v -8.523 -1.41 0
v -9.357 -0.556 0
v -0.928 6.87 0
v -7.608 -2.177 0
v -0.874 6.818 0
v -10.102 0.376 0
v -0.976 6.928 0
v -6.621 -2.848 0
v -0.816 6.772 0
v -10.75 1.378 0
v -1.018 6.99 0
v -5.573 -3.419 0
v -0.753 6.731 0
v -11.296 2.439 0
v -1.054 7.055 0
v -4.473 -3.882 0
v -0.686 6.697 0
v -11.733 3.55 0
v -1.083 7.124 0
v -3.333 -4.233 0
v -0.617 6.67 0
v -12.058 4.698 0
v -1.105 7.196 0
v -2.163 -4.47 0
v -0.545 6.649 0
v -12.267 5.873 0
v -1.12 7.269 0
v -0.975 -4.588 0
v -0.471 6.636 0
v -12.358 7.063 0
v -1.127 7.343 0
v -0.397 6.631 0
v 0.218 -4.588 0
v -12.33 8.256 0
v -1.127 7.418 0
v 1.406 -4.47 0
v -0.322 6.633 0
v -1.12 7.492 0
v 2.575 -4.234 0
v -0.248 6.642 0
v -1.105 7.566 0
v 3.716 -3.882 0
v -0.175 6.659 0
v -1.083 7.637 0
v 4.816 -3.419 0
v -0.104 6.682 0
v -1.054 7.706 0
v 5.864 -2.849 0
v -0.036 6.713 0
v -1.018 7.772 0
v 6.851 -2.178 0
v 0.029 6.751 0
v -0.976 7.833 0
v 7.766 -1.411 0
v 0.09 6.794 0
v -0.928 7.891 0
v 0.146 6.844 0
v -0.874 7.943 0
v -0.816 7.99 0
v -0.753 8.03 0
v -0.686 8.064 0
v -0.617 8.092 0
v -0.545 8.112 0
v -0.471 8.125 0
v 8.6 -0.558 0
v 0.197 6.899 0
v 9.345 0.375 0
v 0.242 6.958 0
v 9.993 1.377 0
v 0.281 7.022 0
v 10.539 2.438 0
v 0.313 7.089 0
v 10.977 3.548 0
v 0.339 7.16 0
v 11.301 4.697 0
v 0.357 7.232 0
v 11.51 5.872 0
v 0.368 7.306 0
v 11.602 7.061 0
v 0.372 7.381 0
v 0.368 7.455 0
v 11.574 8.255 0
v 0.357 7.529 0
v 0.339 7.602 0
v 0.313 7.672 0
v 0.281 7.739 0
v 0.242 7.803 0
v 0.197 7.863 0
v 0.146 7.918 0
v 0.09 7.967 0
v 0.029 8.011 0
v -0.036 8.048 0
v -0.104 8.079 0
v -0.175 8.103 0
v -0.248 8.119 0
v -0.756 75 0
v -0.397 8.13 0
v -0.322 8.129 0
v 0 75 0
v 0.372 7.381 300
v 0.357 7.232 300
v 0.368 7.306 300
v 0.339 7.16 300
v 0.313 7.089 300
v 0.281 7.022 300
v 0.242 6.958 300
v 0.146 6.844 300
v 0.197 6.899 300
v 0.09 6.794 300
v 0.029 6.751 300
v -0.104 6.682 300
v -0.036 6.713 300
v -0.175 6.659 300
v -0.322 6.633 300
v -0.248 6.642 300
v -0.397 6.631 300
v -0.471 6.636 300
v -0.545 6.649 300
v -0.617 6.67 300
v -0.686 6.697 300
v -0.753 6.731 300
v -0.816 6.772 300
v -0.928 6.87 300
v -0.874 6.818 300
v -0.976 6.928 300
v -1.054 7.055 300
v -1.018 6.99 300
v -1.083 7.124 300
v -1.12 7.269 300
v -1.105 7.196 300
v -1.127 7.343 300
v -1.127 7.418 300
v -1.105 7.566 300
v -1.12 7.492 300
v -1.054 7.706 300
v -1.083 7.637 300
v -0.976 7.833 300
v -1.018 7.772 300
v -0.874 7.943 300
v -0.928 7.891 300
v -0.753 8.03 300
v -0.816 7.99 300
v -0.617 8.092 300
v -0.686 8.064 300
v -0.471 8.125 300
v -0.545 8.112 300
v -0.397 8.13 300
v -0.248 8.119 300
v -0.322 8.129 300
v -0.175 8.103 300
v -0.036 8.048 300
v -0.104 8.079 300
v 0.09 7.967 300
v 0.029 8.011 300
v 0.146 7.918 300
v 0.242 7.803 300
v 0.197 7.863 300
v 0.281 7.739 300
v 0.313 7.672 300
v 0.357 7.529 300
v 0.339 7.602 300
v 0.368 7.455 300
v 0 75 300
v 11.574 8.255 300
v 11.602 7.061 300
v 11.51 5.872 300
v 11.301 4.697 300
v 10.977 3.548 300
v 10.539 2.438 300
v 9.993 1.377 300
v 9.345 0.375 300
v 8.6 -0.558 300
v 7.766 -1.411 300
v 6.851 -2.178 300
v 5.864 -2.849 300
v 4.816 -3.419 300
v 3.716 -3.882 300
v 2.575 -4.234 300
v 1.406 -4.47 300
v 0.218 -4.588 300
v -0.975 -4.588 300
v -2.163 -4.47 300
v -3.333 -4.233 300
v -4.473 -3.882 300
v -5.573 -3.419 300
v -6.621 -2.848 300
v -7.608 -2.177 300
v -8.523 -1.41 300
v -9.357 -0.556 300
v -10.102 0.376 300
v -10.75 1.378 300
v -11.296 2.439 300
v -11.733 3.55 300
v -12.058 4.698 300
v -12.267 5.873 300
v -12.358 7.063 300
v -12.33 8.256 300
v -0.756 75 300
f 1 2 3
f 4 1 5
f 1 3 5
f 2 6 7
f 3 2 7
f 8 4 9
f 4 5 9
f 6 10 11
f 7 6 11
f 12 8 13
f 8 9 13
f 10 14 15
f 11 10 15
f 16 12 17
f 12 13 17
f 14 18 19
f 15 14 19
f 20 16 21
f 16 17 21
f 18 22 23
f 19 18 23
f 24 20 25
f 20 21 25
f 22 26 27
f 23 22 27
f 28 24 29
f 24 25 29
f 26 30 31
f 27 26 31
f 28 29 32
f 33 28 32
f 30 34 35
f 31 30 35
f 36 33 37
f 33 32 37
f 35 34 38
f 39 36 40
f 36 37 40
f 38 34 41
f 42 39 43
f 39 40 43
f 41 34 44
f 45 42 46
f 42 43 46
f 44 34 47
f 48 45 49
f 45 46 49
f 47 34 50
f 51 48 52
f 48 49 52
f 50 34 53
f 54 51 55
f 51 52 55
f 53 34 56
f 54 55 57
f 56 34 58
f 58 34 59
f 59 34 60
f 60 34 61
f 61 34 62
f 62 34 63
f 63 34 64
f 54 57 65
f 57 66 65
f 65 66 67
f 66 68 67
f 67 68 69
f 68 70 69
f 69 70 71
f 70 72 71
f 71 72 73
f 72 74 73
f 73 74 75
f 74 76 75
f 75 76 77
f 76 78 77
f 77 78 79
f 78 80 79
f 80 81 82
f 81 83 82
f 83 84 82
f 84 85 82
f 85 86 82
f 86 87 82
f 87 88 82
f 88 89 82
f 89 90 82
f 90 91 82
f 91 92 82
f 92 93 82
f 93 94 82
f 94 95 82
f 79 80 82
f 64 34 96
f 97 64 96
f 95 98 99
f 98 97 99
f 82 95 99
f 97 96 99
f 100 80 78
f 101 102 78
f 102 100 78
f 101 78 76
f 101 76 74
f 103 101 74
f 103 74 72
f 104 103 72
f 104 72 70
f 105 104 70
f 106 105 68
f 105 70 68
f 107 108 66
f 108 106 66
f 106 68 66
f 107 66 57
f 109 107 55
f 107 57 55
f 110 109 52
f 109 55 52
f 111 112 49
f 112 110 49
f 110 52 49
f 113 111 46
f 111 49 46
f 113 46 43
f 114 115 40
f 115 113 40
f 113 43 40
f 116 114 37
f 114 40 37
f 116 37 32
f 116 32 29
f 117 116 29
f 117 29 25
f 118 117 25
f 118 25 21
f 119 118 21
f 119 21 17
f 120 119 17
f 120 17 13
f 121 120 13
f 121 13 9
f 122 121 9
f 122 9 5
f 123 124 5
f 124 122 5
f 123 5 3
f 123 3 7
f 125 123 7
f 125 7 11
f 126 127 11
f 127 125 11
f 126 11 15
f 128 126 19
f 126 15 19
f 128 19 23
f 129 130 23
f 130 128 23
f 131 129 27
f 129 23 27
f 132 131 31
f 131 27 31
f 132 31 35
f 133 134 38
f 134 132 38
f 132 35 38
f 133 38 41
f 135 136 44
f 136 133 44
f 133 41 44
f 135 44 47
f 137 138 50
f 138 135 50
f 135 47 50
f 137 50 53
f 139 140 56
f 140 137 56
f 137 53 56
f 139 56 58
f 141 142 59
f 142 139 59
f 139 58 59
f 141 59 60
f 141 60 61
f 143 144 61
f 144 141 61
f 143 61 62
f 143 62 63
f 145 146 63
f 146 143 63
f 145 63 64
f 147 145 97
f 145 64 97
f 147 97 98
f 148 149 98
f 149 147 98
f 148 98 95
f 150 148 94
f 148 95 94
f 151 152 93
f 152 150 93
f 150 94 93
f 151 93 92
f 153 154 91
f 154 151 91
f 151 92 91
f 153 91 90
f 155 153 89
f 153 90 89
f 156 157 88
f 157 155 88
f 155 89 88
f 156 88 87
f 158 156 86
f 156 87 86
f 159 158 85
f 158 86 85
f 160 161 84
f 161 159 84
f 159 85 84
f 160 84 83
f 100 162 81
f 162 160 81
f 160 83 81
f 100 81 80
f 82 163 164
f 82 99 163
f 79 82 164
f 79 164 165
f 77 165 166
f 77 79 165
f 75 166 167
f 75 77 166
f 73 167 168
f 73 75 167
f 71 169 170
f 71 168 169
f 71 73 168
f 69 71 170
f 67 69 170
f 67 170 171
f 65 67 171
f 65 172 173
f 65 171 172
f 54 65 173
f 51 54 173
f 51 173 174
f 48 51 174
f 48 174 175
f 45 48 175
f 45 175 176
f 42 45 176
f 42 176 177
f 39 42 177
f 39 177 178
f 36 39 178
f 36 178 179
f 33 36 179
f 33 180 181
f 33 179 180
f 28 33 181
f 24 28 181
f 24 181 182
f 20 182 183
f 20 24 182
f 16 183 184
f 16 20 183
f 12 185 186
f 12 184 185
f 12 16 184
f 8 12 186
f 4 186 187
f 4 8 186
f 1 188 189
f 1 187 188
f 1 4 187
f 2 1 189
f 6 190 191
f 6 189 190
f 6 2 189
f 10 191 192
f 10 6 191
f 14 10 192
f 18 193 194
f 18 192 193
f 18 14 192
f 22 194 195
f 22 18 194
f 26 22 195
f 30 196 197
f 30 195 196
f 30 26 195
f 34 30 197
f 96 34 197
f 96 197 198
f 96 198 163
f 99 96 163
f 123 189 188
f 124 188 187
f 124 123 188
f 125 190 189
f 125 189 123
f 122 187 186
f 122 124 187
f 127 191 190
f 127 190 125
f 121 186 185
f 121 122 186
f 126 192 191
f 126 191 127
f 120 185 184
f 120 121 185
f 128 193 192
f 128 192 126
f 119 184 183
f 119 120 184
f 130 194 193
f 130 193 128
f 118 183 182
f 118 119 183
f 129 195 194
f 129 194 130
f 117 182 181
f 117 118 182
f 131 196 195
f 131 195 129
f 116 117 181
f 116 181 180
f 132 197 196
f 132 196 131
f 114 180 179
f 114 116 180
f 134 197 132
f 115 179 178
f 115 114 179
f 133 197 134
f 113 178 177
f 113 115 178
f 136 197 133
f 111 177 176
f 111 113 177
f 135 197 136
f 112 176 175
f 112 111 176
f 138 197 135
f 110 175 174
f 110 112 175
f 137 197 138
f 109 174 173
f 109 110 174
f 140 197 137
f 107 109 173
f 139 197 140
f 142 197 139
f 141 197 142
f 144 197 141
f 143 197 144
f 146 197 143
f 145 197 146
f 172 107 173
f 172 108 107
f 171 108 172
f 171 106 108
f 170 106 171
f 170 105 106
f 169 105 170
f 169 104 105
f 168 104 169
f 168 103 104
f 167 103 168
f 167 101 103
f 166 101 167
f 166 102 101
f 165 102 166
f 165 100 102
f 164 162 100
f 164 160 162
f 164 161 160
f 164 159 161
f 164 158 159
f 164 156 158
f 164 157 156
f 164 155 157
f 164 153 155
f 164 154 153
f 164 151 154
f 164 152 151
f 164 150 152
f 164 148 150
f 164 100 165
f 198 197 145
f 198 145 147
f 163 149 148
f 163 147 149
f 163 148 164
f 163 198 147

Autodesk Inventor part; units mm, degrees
ref_plane "YZ Plane" through (0, 0, 0) normal (1, 0, 0) x (0, 1, 0)
ref_plane "XZ Plane" through (0, 0, 0) normal (0, 1, 0) x (-1, 0, 0)
ref_plane "Work Plane1" through (0, 0, 0) normal (0, 0, 1) x (1, 0, 0)
sketch "Sketch1" plane through (0, 0, 0) normal (0, 0, 1) x (1, 0, 0)
  circle A0 centre (-0.378, 7.3806) radius 0.75 projected
  line L0 (-0.756, 75) -> (0, 75) construction
  arc A1 (-13.4366, 0) -> (12.6806, 0) centre (-0.378, 7.3806) ccw construction
  arc A2 (-12.1028, 9.8588) -> (11.3464, 9.8606) centre (-0.378, 7.3806) ccw
  line L1 (-12.3298, 8.256) -> (-11.557, 13.7119)
  line L2 (11.5739, 8.2546) -> (10.8008, 13.7119)
  line L3 (-12.3298, 8.256) -> (-0.756, 75)
  line L4 (-0.756, 75) -> (0, 75)
  line L5 (0, 75) -> (11.5739, 8.2546)
  spline S0 degree 3 poles (0, 75) (0.0654, 74.6898) (0.2183, 73.9622) (0.6185, 72.0374) (0.8255, 71.0325) (1.5395, 67.5353) (2.0401, 65.0263) (3.7365, 56.3358) (4.8865, 50.1031) (8.482, 29.574) (10.8053, 14.5022) (12.6806, 0) knots -7.652768 -7.652768 -7.652768 -7.652768 -7.375677 -7.375677 -7.074889 -7.074889 -6.315253 -6.315253 -4.432937 -4.432937 -0.050389 -0.050389 -0.050389 -0.050389 projected
  spline S1 degree 3 poles (-13.4366, 0) (-10.3976, 23.501) (-6.0464, 49.5688) (-0.9743, 73.9622) (-0.8214, 74.6898) (-0.756, 75) knots -2.513741 -2.513741 -2.513741 -2.513741 -0.095109 -0.095109 0 0 0 0 projected
  point P0 (0, 0)
ref_plane "Work Plane2" through (-14.7431, -7.9324, 300) normal (0, 0, -1) x (0, 1, 0)
extrude "Extrusion1" add sketch "Sketch1" along normal up to surface (300 mm away) contours L3 L4 L5 A2
properties part number "Vtail"
